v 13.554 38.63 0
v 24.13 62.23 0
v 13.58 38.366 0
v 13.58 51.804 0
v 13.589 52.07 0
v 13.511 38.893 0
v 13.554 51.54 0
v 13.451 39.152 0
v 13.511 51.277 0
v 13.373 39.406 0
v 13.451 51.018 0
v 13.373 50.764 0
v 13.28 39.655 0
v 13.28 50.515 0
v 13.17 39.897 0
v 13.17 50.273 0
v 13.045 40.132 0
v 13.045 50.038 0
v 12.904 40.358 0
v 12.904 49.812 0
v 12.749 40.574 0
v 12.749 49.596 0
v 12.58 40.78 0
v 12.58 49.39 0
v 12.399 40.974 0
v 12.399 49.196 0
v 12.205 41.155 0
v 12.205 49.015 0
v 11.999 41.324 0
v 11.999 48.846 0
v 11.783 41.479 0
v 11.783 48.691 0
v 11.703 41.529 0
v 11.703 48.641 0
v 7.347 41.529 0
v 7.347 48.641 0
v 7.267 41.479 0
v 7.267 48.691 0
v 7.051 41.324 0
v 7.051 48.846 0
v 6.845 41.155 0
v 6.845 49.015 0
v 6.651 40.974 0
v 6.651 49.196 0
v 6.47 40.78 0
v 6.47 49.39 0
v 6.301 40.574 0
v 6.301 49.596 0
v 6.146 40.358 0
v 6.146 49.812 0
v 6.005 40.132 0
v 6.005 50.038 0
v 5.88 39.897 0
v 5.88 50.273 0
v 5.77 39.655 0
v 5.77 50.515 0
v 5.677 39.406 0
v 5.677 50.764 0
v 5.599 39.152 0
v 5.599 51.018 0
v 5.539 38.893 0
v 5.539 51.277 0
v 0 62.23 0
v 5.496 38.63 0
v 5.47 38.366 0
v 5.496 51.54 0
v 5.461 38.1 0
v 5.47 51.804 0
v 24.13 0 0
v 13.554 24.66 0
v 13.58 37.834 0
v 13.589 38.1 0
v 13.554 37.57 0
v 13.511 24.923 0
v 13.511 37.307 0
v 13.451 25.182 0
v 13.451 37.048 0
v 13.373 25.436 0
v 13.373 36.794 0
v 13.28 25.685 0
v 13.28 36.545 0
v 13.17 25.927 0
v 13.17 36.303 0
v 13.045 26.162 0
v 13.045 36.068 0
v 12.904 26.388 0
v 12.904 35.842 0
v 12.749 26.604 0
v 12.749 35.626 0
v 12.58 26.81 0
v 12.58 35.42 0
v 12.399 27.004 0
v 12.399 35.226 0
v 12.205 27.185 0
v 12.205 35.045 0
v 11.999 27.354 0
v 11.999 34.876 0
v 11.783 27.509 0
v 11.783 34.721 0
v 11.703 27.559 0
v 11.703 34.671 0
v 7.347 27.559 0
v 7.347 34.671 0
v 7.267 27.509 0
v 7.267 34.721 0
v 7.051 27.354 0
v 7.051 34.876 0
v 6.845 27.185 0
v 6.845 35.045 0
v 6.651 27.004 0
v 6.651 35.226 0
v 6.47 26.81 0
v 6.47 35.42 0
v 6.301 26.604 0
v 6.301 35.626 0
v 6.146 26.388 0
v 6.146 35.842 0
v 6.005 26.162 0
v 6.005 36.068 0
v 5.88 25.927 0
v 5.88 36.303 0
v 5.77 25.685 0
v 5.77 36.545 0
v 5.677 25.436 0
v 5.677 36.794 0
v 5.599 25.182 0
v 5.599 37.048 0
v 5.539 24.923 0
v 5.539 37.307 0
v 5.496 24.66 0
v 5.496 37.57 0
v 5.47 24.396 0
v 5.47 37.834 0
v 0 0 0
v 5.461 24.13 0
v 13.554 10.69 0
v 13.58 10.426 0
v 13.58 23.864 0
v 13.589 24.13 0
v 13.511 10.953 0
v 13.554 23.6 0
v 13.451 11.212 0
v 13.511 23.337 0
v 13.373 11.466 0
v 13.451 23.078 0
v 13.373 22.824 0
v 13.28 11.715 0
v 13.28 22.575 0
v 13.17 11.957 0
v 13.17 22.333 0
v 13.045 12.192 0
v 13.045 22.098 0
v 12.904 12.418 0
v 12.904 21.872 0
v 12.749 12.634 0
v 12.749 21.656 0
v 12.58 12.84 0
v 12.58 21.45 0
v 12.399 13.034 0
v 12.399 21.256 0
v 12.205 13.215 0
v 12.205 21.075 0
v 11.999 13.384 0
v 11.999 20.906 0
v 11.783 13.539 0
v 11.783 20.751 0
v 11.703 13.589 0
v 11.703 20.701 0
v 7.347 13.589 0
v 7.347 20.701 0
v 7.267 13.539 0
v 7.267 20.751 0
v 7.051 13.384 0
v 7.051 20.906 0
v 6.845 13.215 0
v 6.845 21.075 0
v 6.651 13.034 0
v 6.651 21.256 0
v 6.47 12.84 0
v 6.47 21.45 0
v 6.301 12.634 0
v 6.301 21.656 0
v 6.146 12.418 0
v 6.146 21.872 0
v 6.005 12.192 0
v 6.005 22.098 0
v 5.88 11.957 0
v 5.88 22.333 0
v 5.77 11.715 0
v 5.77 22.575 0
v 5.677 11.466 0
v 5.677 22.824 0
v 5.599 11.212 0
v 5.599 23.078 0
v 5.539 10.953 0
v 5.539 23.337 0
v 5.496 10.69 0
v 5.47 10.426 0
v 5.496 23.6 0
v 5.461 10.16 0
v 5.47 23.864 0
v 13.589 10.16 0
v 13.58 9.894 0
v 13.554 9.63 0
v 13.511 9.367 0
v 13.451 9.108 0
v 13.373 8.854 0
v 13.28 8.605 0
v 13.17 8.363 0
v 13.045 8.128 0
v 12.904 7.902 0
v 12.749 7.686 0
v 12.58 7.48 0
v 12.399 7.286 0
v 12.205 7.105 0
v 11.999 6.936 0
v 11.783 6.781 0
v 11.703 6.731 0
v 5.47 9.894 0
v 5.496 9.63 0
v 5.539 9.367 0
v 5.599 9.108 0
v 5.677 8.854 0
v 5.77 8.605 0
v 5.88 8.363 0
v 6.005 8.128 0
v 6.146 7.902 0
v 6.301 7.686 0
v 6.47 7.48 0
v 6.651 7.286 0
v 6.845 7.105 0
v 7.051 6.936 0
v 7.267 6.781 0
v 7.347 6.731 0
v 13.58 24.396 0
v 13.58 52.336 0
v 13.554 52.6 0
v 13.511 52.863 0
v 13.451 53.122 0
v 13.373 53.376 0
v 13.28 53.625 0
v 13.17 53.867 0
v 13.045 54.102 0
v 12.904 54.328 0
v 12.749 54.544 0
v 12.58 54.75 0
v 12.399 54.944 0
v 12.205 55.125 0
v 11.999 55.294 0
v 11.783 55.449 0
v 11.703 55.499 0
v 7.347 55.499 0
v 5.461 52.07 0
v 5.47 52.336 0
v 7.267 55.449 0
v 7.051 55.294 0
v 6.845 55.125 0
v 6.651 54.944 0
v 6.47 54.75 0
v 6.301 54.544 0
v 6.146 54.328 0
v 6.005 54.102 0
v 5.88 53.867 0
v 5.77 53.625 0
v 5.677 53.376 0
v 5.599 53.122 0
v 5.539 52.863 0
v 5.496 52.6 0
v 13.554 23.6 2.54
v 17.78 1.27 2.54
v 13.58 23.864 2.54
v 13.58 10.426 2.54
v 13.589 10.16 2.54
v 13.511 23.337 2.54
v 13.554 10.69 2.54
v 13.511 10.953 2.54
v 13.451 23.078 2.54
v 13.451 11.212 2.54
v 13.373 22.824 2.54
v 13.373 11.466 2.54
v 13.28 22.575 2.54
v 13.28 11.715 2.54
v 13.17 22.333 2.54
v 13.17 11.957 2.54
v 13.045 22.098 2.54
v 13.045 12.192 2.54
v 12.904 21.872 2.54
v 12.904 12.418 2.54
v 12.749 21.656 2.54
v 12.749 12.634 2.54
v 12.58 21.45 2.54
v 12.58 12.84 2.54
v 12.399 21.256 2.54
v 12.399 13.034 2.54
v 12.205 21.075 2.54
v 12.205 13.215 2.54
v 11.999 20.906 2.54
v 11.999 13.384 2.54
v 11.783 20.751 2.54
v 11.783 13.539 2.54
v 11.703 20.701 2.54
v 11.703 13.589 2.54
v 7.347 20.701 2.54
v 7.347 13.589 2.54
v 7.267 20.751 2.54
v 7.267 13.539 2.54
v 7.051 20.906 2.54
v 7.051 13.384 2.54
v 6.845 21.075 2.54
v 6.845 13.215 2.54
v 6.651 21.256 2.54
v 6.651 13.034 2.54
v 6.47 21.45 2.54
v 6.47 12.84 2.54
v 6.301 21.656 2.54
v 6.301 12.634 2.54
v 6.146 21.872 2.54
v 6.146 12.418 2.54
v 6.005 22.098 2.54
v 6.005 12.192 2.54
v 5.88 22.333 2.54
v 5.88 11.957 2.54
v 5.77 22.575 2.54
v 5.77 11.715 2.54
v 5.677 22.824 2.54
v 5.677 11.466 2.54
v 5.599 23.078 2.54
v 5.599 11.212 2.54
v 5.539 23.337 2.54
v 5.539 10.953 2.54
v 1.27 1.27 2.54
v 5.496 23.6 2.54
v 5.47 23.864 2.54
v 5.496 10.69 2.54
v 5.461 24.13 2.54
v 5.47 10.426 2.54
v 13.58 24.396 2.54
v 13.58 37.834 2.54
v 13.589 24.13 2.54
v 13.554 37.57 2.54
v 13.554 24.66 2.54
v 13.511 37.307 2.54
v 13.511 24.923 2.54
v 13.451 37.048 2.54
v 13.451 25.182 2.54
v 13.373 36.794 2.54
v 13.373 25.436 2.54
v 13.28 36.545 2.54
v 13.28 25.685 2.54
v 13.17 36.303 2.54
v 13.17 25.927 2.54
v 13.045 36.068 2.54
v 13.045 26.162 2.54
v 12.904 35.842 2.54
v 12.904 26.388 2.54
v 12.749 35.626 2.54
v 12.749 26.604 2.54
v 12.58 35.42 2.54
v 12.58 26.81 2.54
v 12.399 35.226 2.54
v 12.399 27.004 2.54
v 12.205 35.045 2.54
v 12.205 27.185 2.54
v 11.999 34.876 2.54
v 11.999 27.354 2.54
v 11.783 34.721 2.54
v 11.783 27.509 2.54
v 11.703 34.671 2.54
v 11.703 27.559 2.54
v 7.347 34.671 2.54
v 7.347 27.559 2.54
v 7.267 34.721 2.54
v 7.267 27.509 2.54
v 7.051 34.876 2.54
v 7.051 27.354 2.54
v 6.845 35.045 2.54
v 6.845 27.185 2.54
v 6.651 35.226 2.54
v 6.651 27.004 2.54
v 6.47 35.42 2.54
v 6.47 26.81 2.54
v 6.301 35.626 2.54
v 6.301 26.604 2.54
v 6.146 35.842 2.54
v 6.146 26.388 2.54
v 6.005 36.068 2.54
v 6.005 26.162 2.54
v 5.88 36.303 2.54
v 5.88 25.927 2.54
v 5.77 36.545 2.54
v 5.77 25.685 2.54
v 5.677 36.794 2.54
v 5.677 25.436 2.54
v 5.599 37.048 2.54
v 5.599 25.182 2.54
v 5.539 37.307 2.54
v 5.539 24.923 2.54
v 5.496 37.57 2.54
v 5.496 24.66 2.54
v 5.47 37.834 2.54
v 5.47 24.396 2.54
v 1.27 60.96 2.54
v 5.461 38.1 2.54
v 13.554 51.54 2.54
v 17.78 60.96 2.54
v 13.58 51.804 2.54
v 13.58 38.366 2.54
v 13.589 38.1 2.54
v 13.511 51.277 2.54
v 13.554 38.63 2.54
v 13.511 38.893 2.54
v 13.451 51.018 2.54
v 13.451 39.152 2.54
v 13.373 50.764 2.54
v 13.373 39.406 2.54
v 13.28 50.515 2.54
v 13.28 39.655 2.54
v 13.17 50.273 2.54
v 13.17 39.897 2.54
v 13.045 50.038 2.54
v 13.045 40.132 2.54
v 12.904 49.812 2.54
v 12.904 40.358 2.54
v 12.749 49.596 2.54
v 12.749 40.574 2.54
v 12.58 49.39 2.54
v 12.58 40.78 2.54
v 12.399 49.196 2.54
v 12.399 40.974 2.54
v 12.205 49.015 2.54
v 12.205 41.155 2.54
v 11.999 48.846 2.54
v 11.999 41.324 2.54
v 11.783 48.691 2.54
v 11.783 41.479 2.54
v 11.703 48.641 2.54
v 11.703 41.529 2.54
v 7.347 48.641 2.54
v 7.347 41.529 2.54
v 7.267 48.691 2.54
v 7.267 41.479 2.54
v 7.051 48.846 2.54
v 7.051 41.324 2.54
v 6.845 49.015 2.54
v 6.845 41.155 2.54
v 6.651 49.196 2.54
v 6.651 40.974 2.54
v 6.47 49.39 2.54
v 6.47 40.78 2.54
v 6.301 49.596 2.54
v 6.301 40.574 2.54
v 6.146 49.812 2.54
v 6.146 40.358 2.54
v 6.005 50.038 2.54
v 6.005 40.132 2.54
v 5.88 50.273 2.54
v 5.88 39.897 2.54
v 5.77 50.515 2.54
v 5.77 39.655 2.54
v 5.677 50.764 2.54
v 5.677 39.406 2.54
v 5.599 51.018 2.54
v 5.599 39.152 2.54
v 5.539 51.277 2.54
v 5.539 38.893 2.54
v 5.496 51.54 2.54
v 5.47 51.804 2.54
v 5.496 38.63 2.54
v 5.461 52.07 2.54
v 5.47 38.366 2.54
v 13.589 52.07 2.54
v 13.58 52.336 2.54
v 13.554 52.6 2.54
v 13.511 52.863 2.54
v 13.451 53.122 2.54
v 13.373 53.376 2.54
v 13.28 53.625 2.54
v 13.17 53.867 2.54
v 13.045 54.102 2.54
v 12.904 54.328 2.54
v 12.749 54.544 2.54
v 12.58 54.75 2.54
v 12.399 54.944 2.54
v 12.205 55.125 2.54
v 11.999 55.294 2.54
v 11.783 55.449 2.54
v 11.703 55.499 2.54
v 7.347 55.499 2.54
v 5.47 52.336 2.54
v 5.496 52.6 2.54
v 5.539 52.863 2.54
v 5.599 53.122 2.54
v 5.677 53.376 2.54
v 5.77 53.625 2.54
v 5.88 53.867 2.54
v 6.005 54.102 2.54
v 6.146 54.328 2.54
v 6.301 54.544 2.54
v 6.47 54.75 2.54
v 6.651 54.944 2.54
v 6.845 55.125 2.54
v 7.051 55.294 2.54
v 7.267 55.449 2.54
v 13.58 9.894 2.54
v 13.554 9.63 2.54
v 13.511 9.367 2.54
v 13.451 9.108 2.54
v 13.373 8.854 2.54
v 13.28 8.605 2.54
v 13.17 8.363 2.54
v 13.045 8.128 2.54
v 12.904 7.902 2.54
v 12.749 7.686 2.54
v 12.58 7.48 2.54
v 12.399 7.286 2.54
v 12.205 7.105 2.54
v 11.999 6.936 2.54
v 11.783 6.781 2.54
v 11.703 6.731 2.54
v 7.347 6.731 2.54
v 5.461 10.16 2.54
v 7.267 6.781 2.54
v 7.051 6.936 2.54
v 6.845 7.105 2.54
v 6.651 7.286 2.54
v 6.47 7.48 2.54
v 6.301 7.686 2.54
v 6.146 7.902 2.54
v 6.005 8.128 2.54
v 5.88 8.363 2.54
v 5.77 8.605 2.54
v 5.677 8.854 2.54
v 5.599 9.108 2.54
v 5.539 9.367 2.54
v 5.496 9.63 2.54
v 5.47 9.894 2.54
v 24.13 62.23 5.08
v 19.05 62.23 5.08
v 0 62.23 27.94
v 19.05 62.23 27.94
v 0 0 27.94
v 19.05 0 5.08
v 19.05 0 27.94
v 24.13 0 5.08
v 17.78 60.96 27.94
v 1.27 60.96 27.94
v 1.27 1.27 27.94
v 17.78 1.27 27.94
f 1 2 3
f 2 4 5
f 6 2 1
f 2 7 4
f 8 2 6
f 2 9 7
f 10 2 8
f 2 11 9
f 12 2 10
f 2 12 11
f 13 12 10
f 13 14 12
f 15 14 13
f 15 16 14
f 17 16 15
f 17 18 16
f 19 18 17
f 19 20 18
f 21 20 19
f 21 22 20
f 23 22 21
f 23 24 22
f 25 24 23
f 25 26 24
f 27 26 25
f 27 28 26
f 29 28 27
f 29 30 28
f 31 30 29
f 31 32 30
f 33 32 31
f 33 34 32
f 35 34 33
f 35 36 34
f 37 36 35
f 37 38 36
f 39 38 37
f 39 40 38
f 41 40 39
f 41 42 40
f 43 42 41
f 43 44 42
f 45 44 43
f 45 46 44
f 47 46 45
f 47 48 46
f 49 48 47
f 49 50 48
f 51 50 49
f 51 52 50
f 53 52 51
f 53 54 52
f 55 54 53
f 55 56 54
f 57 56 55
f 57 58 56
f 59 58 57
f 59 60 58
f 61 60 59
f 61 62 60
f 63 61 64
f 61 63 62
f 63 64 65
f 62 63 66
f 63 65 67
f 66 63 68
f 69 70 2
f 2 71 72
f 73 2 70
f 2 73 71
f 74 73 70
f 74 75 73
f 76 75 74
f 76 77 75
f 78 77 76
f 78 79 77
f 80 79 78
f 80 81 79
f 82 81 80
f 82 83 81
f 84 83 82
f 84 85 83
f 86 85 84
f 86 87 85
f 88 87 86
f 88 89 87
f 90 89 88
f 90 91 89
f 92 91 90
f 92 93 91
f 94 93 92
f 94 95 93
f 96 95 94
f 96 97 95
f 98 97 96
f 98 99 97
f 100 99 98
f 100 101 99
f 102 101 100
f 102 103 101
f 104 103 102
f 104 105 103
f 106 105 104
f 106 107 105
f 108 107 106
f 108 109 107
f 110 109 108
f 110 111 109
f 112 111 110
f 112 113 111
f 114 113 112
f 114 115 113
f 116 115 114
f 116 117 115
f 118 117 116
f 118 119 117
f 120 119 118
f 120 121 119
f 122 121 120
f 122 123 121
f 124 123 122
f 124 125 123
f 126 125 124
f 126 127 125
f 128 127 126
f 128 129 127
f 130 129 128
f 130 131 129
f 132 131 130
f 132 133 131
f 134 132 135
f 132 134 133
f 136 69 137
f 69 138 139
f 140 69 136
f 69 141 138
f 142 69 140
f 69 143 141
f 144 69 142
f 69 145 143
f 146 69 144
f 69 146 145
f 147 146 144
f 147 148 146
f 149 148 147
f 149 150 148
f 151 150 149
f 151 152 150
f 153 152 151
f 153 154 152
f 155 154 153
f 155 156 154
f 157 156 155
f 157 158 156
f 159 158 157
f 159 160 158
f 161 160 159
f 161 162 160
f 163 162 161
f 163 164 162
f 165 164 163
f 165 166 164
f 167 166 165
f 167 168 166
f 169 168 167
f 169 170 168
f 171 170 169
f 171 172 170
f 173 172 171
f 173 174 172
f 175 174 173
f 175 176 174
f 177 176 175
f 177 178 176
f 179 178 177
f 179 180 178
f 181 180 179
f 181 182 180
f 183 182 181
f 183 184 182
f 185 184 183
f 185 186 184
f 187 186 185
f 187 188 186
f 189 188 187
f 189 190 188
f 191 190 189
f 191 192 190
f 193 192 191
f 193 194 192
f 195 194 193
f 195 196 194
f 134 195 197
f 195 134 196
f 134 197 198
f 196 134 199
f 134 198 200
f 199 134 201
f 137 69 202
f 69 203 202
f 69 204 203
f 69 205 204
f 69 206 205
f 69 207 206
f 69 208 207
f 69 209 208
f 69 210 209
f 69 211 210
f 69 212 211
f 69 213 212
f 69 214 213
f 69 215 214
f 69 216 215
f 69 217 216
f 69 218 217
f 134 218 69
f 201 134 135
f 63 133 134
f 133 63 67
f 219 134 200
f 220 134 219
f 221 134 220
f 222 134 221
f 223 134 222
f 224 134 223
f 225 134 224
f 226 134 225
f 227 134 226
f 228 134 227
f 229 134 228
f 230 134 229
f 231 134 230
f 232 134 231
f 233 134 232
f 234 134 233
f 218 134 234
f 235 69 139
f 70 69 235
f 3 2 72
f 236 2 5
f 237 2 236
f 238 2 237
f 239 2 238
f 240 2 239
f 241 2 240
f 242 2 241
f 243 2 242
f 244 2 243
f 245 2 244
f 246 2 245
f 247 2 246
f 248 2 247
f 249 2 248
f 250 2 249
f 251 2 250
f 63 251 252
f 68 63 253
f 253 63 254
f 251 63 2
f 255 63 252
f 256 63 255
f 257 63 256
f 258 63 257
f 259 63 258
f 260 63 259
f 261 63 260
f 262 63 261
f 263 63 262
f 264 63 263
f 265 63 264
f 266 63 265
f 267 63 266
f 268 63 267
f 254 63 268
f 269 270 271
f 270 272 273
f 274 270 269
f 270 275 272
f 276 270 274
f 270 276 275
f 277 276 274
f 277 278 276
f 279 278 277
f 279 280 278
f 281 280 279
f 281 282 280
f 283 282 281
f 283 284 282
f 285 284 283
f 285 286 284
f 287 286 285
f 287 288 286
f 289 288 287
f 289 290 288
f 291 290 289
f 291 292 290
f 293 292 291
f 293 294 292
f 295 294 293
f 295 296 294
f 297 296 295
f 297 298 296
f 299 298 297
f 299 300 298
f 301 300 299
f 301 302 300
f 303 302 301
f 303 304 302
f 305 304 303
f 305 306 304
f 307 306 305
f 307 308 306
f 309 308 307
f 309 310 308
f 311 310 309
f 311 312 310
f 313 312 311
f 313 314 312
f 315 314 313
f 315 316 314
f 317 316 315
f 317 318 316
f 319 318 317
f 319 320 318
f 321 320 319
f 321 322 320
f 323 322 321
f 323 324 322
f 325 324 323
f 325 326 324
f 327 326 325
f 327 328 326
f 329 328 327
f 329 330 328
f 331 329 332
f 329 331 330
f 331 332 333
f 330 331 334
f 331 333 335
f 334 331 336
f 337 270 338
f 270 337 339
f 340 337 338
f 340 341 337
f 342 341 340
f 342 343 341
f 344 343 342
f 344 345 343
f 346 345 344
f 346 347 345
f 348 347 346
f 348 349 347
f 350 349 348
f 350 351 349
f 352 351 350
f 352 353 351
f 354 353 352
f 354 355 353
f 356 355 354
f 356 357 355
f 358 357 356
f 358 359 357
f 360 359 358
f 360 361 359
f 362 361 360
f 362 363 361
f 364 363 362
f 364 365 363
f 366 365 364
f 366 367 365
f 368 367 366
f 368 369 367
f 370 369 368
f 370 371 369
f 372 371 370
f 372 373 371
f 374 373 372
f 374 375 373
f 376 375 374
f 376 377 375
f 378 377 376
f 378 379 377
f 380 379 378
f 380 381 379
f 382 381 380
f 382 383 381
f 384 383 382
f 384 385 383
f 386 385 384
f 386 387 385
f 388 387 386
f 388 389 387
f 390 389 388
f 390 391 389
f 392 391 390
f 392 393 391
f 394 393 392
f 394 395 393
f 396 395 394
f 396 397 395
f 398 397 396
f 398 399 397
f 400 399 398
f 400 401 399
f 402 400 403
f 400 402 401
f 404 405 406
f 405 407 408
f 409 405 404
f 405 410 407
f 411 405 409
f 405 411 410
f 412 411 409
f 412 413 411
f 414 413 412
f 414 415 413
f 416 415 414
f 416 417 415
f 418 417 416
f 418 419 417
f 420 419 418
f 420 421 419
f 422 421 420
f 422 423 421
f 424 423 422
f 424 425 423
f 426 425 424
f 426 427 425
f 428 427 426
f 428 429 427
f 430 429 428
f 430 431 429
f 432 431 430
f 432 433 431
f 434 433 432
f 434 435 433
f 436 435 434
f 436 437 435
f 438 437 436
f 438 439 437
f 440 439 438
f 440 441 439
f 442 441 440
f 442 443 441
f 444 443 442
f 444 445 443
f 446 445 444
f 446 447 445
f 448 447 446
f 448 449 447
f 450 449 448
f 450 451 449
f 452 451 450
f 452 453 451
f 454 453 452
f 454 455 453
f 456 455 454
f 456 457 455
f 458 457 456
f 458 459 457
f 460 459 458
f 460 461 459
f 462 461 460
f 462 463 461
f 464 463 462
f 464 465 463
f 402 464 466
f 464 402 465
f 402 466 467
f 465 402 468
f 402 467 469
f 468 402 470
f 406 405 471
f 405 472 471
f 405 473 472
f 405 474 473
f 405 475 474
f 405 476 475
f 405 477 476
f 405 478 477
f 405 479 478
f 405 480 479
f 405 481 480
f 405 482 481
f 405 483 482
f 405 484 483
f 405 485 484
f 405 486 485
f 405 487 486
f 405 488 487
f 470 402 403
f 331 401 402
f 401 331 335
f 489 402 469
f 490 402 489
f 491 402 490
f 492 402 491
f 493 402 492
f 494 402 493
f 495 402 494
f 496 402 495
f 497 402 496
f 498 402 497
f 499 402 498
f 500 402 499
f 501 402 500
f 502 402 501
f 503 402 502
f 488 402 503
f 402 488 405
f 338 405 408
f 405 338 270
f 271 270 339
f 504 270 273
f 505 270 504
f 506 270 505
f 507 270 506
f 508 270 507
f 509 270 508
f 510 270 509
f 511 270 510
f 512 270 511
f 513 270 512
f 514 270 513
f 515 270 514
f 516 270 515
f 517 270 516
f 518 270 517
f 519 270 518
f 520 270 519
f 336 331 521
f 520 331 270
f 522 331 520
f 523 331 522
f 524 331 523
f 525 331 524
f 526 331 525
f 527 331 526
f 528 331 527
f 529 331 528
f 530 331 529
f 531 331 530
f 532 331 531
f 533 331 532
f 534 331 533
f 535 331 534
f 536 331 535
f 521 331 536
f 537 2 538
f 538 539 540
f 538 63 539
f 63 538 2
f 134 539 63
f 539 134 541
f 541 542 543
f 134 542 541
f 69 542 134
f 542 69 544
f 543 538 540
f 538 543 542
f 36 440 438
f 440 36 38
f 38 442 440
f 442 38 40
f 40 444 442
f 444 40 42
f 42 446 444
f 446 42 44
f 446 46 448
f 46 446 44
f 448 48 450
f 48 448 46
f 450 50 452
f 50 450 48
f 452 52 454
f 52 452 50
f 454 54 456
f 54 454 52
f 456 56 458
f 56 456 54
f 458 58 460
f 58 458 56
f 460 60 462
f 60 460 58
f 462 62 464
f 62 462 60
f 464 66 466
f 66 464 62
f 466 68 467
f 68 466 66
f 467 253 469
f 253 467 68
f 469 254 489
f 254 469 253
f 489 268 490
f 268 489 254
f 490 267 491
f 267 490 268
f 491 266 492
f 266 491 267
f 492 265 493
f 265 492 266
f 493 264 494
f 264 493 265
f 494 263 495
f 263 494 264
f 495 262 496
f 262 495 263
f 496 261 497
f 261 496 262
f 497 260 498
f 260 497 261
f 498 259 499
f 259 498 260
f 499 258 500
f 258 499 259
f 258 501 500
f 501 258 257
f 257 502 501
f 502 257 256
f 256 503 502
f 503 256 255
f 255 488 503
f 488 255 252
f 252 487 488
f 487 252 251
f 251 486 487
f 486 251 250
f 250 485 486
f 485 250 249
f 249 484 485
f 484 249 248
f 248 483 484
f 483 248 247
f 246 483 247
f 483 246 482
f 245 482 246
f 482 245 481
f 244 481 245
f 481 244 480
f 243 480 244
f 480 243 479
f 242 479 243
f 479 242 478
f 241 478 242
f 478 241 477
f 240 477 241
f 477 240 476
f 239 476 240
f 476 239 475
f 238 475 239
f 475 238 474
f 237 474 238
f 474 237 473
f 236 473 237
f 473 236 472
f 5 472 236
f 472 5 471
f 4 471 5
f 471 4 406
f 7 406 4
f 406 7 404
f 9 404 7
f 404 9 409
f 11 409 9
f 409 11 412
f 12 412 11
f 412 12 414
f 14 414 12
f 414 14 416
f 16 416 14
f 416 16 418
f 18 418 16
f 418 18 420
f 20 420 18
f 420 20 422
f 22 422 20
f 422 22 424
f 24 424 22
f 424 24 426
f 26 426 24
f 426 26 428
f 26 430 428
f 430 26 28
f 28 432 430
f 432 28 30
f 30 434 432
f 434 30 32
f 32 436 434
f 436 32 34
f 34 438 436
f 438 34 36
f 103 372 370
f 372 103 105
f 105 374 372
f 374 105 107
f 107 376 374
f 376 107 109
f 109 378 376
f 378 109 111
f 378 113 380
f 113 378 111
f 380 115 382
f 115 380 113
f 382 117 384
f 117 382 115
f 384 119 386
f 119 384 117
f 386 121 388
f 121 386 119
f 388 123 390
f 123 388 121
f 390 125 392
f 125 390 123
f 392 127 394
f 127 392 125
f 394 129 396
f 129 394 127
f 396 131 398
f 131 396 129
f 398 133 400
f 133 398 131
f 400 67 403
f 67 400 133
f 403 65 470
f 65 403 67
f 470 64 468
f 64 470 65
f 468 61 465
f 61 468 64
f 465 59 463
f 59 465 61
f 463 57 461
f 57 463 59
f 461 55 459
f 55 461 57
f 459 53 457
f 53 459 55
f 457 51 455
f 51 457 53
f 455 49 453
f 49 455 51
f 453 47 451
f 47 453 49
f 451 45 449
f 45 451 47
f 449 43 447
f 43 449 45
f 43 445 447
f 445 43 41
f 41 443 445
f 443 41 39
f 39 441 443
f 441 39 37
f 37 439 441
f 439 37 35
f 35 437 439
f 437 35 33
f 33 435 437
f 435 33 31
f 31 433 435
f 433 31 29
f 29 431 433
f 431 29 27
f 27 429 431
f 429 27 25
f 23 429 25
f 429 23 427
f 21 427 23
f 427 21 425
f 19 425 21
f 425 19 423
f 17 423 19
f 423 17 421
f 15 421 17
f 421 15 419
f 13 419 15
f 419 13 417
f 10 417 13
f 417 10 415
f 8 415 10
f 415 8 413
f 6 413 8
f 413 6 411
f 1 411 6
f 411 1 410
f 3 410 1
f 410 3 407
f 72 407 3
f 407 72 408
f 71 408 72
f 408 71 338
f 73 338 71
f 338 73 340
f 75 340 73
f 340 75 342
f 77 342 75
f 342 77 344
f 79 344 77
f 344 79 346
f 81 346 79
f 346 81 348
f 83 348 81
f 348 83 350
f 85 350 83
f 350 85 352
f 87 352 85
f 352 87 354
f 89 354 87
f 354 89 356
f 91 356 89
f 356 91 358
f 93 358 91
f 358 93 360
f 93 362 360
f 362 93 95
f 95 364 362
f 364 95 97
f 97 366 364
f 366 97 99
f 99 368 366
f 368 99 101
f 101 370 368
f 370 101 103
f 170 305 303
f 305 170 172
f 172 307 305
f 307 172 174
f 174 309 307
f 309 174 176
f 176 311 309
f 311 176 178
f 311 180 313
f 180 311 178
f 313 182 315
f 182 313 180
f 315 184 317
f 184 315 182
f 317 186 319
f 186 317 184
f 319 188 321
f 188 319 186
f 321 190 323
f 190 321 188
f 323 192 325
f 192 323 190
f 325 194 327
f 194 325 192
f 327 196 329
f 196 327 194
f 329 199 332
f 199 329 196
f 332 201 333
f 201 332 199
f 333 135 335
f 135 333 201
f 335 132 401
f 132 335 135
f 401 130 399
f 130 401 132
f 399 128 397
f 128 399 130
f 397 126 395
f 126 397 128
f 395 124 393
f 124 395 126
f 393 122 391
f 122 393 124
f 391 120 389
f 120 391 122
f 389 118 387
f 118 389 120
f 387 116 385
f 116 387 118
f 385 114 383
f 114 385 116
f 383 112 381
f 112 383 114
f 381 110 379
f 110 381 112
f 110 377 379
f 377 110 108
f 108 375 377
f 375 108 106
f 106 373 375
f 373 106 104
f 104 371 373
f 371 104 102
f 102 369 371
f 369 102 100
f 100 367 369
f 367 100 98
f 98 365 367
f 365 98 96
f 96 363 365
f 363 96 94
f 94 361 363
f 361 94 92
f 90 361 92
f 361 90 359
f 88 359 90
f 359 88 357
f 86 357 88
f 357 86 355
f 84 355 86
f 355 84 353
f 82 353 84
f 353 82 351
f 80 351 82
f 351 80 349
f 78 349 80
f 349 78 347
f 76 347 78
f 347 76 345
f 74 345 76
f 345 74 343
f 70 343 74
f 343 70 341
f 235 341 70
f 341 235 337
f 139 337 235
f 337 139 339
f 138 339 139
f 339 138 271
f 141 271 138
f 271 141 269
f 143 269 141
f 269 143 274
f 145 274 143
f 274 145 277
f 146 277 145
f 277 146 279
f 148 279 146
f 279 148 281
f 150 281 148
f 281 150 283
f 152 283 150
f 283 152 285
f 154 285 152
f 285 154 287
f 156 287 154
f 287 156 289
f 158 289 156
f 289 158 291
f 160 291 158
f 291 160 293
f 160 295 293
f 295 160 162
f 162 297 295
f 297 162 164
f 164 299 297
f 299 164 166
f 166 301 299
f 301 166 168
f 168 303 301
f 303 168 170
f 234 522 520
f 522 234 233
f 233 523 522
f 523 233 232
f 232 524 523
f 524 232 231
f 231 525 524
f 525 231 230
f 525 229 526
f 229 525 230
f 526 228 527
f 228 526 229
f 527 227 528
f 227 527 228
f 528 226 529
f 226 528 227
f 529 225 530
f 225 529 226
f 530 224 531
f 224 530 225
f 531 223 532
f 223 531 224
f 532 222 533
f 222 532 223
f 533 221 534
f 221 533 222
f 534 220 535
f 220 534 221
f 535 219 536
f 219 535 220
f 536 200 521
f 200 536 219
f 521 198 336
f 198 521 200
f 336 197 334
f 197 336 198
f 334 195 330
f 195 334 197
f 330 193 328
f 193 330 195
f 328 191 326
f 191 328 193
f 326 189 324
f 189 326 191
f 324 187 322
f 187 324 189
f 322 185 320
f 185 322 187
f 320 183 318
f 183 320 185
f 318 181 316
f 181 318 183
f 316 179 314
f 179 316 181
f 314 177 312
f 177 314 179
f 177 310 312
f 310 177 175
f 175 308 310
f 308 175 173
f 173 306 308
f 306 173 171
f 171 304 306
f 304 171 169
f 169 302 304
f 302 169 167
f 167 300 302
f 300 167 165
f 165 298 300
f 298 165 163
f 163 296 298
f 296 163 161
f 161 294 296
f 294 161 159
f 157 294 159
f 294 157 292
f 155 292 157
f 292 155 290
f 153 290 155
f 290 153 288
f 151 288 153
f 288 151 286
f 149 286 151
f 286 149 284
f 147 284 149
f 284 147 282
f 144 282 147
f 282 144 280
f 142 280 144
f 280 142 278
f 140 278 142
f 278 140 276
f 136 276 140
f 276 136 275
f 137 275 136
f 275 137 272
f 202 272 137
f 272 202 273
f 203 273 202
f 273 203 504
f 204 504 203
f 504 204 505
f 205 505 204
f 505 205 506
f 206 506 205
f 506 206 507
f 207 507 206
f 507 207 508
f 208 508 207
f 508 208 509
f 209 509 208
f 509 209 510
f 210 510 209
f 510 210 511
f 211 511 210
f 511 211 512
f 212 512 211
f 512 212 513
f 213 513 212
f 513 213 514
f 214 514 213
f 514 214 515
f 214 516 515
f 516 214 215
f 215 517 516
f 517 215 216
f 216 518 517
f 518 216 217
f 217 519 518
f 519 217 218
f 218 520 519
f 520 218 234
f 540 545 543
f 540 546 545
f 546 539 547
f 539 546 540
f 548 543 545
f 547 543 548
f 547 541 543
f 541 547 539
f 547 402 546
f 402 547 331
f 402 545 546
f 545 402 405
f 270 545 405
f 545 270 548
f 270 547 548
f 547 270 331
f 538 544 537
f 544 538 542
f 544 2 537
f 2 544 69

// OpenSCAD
ViewScale = [0.0254, 0.0254, 0.0254];

module onehole()
{
    intersection() {
    circle(160, $fn=96);
    square([500, 270], center=true);
    }
}

module fourholes()
{
    onehole();
    translate([0, 550, 0])
    onehole();
    translate([0, 1100, 0])
    onehole();
    translate([0, 1100+550, 0])
    onehole();
}


module panel()
{
    difference() {
    square([750, 1400+500+550]);
    translate([375, 150+250, 0])
    fourholes();
    }
}

module walls()
{
    difference() {
        square([750, 1400+500+550], center=true);
        square([650, 1400+400+550], center=true);
    }
}

module connectors()
{
    linear_extrude(100)
    panel();
    translate([375, 950+275, 100])
    linear_extrude(1000)
    walls();
    linear_extrude(200)
    translate([750, 0, 0])
    square([200, 2450]);

}

scale(ViewScale)
{
    connectors();
}
